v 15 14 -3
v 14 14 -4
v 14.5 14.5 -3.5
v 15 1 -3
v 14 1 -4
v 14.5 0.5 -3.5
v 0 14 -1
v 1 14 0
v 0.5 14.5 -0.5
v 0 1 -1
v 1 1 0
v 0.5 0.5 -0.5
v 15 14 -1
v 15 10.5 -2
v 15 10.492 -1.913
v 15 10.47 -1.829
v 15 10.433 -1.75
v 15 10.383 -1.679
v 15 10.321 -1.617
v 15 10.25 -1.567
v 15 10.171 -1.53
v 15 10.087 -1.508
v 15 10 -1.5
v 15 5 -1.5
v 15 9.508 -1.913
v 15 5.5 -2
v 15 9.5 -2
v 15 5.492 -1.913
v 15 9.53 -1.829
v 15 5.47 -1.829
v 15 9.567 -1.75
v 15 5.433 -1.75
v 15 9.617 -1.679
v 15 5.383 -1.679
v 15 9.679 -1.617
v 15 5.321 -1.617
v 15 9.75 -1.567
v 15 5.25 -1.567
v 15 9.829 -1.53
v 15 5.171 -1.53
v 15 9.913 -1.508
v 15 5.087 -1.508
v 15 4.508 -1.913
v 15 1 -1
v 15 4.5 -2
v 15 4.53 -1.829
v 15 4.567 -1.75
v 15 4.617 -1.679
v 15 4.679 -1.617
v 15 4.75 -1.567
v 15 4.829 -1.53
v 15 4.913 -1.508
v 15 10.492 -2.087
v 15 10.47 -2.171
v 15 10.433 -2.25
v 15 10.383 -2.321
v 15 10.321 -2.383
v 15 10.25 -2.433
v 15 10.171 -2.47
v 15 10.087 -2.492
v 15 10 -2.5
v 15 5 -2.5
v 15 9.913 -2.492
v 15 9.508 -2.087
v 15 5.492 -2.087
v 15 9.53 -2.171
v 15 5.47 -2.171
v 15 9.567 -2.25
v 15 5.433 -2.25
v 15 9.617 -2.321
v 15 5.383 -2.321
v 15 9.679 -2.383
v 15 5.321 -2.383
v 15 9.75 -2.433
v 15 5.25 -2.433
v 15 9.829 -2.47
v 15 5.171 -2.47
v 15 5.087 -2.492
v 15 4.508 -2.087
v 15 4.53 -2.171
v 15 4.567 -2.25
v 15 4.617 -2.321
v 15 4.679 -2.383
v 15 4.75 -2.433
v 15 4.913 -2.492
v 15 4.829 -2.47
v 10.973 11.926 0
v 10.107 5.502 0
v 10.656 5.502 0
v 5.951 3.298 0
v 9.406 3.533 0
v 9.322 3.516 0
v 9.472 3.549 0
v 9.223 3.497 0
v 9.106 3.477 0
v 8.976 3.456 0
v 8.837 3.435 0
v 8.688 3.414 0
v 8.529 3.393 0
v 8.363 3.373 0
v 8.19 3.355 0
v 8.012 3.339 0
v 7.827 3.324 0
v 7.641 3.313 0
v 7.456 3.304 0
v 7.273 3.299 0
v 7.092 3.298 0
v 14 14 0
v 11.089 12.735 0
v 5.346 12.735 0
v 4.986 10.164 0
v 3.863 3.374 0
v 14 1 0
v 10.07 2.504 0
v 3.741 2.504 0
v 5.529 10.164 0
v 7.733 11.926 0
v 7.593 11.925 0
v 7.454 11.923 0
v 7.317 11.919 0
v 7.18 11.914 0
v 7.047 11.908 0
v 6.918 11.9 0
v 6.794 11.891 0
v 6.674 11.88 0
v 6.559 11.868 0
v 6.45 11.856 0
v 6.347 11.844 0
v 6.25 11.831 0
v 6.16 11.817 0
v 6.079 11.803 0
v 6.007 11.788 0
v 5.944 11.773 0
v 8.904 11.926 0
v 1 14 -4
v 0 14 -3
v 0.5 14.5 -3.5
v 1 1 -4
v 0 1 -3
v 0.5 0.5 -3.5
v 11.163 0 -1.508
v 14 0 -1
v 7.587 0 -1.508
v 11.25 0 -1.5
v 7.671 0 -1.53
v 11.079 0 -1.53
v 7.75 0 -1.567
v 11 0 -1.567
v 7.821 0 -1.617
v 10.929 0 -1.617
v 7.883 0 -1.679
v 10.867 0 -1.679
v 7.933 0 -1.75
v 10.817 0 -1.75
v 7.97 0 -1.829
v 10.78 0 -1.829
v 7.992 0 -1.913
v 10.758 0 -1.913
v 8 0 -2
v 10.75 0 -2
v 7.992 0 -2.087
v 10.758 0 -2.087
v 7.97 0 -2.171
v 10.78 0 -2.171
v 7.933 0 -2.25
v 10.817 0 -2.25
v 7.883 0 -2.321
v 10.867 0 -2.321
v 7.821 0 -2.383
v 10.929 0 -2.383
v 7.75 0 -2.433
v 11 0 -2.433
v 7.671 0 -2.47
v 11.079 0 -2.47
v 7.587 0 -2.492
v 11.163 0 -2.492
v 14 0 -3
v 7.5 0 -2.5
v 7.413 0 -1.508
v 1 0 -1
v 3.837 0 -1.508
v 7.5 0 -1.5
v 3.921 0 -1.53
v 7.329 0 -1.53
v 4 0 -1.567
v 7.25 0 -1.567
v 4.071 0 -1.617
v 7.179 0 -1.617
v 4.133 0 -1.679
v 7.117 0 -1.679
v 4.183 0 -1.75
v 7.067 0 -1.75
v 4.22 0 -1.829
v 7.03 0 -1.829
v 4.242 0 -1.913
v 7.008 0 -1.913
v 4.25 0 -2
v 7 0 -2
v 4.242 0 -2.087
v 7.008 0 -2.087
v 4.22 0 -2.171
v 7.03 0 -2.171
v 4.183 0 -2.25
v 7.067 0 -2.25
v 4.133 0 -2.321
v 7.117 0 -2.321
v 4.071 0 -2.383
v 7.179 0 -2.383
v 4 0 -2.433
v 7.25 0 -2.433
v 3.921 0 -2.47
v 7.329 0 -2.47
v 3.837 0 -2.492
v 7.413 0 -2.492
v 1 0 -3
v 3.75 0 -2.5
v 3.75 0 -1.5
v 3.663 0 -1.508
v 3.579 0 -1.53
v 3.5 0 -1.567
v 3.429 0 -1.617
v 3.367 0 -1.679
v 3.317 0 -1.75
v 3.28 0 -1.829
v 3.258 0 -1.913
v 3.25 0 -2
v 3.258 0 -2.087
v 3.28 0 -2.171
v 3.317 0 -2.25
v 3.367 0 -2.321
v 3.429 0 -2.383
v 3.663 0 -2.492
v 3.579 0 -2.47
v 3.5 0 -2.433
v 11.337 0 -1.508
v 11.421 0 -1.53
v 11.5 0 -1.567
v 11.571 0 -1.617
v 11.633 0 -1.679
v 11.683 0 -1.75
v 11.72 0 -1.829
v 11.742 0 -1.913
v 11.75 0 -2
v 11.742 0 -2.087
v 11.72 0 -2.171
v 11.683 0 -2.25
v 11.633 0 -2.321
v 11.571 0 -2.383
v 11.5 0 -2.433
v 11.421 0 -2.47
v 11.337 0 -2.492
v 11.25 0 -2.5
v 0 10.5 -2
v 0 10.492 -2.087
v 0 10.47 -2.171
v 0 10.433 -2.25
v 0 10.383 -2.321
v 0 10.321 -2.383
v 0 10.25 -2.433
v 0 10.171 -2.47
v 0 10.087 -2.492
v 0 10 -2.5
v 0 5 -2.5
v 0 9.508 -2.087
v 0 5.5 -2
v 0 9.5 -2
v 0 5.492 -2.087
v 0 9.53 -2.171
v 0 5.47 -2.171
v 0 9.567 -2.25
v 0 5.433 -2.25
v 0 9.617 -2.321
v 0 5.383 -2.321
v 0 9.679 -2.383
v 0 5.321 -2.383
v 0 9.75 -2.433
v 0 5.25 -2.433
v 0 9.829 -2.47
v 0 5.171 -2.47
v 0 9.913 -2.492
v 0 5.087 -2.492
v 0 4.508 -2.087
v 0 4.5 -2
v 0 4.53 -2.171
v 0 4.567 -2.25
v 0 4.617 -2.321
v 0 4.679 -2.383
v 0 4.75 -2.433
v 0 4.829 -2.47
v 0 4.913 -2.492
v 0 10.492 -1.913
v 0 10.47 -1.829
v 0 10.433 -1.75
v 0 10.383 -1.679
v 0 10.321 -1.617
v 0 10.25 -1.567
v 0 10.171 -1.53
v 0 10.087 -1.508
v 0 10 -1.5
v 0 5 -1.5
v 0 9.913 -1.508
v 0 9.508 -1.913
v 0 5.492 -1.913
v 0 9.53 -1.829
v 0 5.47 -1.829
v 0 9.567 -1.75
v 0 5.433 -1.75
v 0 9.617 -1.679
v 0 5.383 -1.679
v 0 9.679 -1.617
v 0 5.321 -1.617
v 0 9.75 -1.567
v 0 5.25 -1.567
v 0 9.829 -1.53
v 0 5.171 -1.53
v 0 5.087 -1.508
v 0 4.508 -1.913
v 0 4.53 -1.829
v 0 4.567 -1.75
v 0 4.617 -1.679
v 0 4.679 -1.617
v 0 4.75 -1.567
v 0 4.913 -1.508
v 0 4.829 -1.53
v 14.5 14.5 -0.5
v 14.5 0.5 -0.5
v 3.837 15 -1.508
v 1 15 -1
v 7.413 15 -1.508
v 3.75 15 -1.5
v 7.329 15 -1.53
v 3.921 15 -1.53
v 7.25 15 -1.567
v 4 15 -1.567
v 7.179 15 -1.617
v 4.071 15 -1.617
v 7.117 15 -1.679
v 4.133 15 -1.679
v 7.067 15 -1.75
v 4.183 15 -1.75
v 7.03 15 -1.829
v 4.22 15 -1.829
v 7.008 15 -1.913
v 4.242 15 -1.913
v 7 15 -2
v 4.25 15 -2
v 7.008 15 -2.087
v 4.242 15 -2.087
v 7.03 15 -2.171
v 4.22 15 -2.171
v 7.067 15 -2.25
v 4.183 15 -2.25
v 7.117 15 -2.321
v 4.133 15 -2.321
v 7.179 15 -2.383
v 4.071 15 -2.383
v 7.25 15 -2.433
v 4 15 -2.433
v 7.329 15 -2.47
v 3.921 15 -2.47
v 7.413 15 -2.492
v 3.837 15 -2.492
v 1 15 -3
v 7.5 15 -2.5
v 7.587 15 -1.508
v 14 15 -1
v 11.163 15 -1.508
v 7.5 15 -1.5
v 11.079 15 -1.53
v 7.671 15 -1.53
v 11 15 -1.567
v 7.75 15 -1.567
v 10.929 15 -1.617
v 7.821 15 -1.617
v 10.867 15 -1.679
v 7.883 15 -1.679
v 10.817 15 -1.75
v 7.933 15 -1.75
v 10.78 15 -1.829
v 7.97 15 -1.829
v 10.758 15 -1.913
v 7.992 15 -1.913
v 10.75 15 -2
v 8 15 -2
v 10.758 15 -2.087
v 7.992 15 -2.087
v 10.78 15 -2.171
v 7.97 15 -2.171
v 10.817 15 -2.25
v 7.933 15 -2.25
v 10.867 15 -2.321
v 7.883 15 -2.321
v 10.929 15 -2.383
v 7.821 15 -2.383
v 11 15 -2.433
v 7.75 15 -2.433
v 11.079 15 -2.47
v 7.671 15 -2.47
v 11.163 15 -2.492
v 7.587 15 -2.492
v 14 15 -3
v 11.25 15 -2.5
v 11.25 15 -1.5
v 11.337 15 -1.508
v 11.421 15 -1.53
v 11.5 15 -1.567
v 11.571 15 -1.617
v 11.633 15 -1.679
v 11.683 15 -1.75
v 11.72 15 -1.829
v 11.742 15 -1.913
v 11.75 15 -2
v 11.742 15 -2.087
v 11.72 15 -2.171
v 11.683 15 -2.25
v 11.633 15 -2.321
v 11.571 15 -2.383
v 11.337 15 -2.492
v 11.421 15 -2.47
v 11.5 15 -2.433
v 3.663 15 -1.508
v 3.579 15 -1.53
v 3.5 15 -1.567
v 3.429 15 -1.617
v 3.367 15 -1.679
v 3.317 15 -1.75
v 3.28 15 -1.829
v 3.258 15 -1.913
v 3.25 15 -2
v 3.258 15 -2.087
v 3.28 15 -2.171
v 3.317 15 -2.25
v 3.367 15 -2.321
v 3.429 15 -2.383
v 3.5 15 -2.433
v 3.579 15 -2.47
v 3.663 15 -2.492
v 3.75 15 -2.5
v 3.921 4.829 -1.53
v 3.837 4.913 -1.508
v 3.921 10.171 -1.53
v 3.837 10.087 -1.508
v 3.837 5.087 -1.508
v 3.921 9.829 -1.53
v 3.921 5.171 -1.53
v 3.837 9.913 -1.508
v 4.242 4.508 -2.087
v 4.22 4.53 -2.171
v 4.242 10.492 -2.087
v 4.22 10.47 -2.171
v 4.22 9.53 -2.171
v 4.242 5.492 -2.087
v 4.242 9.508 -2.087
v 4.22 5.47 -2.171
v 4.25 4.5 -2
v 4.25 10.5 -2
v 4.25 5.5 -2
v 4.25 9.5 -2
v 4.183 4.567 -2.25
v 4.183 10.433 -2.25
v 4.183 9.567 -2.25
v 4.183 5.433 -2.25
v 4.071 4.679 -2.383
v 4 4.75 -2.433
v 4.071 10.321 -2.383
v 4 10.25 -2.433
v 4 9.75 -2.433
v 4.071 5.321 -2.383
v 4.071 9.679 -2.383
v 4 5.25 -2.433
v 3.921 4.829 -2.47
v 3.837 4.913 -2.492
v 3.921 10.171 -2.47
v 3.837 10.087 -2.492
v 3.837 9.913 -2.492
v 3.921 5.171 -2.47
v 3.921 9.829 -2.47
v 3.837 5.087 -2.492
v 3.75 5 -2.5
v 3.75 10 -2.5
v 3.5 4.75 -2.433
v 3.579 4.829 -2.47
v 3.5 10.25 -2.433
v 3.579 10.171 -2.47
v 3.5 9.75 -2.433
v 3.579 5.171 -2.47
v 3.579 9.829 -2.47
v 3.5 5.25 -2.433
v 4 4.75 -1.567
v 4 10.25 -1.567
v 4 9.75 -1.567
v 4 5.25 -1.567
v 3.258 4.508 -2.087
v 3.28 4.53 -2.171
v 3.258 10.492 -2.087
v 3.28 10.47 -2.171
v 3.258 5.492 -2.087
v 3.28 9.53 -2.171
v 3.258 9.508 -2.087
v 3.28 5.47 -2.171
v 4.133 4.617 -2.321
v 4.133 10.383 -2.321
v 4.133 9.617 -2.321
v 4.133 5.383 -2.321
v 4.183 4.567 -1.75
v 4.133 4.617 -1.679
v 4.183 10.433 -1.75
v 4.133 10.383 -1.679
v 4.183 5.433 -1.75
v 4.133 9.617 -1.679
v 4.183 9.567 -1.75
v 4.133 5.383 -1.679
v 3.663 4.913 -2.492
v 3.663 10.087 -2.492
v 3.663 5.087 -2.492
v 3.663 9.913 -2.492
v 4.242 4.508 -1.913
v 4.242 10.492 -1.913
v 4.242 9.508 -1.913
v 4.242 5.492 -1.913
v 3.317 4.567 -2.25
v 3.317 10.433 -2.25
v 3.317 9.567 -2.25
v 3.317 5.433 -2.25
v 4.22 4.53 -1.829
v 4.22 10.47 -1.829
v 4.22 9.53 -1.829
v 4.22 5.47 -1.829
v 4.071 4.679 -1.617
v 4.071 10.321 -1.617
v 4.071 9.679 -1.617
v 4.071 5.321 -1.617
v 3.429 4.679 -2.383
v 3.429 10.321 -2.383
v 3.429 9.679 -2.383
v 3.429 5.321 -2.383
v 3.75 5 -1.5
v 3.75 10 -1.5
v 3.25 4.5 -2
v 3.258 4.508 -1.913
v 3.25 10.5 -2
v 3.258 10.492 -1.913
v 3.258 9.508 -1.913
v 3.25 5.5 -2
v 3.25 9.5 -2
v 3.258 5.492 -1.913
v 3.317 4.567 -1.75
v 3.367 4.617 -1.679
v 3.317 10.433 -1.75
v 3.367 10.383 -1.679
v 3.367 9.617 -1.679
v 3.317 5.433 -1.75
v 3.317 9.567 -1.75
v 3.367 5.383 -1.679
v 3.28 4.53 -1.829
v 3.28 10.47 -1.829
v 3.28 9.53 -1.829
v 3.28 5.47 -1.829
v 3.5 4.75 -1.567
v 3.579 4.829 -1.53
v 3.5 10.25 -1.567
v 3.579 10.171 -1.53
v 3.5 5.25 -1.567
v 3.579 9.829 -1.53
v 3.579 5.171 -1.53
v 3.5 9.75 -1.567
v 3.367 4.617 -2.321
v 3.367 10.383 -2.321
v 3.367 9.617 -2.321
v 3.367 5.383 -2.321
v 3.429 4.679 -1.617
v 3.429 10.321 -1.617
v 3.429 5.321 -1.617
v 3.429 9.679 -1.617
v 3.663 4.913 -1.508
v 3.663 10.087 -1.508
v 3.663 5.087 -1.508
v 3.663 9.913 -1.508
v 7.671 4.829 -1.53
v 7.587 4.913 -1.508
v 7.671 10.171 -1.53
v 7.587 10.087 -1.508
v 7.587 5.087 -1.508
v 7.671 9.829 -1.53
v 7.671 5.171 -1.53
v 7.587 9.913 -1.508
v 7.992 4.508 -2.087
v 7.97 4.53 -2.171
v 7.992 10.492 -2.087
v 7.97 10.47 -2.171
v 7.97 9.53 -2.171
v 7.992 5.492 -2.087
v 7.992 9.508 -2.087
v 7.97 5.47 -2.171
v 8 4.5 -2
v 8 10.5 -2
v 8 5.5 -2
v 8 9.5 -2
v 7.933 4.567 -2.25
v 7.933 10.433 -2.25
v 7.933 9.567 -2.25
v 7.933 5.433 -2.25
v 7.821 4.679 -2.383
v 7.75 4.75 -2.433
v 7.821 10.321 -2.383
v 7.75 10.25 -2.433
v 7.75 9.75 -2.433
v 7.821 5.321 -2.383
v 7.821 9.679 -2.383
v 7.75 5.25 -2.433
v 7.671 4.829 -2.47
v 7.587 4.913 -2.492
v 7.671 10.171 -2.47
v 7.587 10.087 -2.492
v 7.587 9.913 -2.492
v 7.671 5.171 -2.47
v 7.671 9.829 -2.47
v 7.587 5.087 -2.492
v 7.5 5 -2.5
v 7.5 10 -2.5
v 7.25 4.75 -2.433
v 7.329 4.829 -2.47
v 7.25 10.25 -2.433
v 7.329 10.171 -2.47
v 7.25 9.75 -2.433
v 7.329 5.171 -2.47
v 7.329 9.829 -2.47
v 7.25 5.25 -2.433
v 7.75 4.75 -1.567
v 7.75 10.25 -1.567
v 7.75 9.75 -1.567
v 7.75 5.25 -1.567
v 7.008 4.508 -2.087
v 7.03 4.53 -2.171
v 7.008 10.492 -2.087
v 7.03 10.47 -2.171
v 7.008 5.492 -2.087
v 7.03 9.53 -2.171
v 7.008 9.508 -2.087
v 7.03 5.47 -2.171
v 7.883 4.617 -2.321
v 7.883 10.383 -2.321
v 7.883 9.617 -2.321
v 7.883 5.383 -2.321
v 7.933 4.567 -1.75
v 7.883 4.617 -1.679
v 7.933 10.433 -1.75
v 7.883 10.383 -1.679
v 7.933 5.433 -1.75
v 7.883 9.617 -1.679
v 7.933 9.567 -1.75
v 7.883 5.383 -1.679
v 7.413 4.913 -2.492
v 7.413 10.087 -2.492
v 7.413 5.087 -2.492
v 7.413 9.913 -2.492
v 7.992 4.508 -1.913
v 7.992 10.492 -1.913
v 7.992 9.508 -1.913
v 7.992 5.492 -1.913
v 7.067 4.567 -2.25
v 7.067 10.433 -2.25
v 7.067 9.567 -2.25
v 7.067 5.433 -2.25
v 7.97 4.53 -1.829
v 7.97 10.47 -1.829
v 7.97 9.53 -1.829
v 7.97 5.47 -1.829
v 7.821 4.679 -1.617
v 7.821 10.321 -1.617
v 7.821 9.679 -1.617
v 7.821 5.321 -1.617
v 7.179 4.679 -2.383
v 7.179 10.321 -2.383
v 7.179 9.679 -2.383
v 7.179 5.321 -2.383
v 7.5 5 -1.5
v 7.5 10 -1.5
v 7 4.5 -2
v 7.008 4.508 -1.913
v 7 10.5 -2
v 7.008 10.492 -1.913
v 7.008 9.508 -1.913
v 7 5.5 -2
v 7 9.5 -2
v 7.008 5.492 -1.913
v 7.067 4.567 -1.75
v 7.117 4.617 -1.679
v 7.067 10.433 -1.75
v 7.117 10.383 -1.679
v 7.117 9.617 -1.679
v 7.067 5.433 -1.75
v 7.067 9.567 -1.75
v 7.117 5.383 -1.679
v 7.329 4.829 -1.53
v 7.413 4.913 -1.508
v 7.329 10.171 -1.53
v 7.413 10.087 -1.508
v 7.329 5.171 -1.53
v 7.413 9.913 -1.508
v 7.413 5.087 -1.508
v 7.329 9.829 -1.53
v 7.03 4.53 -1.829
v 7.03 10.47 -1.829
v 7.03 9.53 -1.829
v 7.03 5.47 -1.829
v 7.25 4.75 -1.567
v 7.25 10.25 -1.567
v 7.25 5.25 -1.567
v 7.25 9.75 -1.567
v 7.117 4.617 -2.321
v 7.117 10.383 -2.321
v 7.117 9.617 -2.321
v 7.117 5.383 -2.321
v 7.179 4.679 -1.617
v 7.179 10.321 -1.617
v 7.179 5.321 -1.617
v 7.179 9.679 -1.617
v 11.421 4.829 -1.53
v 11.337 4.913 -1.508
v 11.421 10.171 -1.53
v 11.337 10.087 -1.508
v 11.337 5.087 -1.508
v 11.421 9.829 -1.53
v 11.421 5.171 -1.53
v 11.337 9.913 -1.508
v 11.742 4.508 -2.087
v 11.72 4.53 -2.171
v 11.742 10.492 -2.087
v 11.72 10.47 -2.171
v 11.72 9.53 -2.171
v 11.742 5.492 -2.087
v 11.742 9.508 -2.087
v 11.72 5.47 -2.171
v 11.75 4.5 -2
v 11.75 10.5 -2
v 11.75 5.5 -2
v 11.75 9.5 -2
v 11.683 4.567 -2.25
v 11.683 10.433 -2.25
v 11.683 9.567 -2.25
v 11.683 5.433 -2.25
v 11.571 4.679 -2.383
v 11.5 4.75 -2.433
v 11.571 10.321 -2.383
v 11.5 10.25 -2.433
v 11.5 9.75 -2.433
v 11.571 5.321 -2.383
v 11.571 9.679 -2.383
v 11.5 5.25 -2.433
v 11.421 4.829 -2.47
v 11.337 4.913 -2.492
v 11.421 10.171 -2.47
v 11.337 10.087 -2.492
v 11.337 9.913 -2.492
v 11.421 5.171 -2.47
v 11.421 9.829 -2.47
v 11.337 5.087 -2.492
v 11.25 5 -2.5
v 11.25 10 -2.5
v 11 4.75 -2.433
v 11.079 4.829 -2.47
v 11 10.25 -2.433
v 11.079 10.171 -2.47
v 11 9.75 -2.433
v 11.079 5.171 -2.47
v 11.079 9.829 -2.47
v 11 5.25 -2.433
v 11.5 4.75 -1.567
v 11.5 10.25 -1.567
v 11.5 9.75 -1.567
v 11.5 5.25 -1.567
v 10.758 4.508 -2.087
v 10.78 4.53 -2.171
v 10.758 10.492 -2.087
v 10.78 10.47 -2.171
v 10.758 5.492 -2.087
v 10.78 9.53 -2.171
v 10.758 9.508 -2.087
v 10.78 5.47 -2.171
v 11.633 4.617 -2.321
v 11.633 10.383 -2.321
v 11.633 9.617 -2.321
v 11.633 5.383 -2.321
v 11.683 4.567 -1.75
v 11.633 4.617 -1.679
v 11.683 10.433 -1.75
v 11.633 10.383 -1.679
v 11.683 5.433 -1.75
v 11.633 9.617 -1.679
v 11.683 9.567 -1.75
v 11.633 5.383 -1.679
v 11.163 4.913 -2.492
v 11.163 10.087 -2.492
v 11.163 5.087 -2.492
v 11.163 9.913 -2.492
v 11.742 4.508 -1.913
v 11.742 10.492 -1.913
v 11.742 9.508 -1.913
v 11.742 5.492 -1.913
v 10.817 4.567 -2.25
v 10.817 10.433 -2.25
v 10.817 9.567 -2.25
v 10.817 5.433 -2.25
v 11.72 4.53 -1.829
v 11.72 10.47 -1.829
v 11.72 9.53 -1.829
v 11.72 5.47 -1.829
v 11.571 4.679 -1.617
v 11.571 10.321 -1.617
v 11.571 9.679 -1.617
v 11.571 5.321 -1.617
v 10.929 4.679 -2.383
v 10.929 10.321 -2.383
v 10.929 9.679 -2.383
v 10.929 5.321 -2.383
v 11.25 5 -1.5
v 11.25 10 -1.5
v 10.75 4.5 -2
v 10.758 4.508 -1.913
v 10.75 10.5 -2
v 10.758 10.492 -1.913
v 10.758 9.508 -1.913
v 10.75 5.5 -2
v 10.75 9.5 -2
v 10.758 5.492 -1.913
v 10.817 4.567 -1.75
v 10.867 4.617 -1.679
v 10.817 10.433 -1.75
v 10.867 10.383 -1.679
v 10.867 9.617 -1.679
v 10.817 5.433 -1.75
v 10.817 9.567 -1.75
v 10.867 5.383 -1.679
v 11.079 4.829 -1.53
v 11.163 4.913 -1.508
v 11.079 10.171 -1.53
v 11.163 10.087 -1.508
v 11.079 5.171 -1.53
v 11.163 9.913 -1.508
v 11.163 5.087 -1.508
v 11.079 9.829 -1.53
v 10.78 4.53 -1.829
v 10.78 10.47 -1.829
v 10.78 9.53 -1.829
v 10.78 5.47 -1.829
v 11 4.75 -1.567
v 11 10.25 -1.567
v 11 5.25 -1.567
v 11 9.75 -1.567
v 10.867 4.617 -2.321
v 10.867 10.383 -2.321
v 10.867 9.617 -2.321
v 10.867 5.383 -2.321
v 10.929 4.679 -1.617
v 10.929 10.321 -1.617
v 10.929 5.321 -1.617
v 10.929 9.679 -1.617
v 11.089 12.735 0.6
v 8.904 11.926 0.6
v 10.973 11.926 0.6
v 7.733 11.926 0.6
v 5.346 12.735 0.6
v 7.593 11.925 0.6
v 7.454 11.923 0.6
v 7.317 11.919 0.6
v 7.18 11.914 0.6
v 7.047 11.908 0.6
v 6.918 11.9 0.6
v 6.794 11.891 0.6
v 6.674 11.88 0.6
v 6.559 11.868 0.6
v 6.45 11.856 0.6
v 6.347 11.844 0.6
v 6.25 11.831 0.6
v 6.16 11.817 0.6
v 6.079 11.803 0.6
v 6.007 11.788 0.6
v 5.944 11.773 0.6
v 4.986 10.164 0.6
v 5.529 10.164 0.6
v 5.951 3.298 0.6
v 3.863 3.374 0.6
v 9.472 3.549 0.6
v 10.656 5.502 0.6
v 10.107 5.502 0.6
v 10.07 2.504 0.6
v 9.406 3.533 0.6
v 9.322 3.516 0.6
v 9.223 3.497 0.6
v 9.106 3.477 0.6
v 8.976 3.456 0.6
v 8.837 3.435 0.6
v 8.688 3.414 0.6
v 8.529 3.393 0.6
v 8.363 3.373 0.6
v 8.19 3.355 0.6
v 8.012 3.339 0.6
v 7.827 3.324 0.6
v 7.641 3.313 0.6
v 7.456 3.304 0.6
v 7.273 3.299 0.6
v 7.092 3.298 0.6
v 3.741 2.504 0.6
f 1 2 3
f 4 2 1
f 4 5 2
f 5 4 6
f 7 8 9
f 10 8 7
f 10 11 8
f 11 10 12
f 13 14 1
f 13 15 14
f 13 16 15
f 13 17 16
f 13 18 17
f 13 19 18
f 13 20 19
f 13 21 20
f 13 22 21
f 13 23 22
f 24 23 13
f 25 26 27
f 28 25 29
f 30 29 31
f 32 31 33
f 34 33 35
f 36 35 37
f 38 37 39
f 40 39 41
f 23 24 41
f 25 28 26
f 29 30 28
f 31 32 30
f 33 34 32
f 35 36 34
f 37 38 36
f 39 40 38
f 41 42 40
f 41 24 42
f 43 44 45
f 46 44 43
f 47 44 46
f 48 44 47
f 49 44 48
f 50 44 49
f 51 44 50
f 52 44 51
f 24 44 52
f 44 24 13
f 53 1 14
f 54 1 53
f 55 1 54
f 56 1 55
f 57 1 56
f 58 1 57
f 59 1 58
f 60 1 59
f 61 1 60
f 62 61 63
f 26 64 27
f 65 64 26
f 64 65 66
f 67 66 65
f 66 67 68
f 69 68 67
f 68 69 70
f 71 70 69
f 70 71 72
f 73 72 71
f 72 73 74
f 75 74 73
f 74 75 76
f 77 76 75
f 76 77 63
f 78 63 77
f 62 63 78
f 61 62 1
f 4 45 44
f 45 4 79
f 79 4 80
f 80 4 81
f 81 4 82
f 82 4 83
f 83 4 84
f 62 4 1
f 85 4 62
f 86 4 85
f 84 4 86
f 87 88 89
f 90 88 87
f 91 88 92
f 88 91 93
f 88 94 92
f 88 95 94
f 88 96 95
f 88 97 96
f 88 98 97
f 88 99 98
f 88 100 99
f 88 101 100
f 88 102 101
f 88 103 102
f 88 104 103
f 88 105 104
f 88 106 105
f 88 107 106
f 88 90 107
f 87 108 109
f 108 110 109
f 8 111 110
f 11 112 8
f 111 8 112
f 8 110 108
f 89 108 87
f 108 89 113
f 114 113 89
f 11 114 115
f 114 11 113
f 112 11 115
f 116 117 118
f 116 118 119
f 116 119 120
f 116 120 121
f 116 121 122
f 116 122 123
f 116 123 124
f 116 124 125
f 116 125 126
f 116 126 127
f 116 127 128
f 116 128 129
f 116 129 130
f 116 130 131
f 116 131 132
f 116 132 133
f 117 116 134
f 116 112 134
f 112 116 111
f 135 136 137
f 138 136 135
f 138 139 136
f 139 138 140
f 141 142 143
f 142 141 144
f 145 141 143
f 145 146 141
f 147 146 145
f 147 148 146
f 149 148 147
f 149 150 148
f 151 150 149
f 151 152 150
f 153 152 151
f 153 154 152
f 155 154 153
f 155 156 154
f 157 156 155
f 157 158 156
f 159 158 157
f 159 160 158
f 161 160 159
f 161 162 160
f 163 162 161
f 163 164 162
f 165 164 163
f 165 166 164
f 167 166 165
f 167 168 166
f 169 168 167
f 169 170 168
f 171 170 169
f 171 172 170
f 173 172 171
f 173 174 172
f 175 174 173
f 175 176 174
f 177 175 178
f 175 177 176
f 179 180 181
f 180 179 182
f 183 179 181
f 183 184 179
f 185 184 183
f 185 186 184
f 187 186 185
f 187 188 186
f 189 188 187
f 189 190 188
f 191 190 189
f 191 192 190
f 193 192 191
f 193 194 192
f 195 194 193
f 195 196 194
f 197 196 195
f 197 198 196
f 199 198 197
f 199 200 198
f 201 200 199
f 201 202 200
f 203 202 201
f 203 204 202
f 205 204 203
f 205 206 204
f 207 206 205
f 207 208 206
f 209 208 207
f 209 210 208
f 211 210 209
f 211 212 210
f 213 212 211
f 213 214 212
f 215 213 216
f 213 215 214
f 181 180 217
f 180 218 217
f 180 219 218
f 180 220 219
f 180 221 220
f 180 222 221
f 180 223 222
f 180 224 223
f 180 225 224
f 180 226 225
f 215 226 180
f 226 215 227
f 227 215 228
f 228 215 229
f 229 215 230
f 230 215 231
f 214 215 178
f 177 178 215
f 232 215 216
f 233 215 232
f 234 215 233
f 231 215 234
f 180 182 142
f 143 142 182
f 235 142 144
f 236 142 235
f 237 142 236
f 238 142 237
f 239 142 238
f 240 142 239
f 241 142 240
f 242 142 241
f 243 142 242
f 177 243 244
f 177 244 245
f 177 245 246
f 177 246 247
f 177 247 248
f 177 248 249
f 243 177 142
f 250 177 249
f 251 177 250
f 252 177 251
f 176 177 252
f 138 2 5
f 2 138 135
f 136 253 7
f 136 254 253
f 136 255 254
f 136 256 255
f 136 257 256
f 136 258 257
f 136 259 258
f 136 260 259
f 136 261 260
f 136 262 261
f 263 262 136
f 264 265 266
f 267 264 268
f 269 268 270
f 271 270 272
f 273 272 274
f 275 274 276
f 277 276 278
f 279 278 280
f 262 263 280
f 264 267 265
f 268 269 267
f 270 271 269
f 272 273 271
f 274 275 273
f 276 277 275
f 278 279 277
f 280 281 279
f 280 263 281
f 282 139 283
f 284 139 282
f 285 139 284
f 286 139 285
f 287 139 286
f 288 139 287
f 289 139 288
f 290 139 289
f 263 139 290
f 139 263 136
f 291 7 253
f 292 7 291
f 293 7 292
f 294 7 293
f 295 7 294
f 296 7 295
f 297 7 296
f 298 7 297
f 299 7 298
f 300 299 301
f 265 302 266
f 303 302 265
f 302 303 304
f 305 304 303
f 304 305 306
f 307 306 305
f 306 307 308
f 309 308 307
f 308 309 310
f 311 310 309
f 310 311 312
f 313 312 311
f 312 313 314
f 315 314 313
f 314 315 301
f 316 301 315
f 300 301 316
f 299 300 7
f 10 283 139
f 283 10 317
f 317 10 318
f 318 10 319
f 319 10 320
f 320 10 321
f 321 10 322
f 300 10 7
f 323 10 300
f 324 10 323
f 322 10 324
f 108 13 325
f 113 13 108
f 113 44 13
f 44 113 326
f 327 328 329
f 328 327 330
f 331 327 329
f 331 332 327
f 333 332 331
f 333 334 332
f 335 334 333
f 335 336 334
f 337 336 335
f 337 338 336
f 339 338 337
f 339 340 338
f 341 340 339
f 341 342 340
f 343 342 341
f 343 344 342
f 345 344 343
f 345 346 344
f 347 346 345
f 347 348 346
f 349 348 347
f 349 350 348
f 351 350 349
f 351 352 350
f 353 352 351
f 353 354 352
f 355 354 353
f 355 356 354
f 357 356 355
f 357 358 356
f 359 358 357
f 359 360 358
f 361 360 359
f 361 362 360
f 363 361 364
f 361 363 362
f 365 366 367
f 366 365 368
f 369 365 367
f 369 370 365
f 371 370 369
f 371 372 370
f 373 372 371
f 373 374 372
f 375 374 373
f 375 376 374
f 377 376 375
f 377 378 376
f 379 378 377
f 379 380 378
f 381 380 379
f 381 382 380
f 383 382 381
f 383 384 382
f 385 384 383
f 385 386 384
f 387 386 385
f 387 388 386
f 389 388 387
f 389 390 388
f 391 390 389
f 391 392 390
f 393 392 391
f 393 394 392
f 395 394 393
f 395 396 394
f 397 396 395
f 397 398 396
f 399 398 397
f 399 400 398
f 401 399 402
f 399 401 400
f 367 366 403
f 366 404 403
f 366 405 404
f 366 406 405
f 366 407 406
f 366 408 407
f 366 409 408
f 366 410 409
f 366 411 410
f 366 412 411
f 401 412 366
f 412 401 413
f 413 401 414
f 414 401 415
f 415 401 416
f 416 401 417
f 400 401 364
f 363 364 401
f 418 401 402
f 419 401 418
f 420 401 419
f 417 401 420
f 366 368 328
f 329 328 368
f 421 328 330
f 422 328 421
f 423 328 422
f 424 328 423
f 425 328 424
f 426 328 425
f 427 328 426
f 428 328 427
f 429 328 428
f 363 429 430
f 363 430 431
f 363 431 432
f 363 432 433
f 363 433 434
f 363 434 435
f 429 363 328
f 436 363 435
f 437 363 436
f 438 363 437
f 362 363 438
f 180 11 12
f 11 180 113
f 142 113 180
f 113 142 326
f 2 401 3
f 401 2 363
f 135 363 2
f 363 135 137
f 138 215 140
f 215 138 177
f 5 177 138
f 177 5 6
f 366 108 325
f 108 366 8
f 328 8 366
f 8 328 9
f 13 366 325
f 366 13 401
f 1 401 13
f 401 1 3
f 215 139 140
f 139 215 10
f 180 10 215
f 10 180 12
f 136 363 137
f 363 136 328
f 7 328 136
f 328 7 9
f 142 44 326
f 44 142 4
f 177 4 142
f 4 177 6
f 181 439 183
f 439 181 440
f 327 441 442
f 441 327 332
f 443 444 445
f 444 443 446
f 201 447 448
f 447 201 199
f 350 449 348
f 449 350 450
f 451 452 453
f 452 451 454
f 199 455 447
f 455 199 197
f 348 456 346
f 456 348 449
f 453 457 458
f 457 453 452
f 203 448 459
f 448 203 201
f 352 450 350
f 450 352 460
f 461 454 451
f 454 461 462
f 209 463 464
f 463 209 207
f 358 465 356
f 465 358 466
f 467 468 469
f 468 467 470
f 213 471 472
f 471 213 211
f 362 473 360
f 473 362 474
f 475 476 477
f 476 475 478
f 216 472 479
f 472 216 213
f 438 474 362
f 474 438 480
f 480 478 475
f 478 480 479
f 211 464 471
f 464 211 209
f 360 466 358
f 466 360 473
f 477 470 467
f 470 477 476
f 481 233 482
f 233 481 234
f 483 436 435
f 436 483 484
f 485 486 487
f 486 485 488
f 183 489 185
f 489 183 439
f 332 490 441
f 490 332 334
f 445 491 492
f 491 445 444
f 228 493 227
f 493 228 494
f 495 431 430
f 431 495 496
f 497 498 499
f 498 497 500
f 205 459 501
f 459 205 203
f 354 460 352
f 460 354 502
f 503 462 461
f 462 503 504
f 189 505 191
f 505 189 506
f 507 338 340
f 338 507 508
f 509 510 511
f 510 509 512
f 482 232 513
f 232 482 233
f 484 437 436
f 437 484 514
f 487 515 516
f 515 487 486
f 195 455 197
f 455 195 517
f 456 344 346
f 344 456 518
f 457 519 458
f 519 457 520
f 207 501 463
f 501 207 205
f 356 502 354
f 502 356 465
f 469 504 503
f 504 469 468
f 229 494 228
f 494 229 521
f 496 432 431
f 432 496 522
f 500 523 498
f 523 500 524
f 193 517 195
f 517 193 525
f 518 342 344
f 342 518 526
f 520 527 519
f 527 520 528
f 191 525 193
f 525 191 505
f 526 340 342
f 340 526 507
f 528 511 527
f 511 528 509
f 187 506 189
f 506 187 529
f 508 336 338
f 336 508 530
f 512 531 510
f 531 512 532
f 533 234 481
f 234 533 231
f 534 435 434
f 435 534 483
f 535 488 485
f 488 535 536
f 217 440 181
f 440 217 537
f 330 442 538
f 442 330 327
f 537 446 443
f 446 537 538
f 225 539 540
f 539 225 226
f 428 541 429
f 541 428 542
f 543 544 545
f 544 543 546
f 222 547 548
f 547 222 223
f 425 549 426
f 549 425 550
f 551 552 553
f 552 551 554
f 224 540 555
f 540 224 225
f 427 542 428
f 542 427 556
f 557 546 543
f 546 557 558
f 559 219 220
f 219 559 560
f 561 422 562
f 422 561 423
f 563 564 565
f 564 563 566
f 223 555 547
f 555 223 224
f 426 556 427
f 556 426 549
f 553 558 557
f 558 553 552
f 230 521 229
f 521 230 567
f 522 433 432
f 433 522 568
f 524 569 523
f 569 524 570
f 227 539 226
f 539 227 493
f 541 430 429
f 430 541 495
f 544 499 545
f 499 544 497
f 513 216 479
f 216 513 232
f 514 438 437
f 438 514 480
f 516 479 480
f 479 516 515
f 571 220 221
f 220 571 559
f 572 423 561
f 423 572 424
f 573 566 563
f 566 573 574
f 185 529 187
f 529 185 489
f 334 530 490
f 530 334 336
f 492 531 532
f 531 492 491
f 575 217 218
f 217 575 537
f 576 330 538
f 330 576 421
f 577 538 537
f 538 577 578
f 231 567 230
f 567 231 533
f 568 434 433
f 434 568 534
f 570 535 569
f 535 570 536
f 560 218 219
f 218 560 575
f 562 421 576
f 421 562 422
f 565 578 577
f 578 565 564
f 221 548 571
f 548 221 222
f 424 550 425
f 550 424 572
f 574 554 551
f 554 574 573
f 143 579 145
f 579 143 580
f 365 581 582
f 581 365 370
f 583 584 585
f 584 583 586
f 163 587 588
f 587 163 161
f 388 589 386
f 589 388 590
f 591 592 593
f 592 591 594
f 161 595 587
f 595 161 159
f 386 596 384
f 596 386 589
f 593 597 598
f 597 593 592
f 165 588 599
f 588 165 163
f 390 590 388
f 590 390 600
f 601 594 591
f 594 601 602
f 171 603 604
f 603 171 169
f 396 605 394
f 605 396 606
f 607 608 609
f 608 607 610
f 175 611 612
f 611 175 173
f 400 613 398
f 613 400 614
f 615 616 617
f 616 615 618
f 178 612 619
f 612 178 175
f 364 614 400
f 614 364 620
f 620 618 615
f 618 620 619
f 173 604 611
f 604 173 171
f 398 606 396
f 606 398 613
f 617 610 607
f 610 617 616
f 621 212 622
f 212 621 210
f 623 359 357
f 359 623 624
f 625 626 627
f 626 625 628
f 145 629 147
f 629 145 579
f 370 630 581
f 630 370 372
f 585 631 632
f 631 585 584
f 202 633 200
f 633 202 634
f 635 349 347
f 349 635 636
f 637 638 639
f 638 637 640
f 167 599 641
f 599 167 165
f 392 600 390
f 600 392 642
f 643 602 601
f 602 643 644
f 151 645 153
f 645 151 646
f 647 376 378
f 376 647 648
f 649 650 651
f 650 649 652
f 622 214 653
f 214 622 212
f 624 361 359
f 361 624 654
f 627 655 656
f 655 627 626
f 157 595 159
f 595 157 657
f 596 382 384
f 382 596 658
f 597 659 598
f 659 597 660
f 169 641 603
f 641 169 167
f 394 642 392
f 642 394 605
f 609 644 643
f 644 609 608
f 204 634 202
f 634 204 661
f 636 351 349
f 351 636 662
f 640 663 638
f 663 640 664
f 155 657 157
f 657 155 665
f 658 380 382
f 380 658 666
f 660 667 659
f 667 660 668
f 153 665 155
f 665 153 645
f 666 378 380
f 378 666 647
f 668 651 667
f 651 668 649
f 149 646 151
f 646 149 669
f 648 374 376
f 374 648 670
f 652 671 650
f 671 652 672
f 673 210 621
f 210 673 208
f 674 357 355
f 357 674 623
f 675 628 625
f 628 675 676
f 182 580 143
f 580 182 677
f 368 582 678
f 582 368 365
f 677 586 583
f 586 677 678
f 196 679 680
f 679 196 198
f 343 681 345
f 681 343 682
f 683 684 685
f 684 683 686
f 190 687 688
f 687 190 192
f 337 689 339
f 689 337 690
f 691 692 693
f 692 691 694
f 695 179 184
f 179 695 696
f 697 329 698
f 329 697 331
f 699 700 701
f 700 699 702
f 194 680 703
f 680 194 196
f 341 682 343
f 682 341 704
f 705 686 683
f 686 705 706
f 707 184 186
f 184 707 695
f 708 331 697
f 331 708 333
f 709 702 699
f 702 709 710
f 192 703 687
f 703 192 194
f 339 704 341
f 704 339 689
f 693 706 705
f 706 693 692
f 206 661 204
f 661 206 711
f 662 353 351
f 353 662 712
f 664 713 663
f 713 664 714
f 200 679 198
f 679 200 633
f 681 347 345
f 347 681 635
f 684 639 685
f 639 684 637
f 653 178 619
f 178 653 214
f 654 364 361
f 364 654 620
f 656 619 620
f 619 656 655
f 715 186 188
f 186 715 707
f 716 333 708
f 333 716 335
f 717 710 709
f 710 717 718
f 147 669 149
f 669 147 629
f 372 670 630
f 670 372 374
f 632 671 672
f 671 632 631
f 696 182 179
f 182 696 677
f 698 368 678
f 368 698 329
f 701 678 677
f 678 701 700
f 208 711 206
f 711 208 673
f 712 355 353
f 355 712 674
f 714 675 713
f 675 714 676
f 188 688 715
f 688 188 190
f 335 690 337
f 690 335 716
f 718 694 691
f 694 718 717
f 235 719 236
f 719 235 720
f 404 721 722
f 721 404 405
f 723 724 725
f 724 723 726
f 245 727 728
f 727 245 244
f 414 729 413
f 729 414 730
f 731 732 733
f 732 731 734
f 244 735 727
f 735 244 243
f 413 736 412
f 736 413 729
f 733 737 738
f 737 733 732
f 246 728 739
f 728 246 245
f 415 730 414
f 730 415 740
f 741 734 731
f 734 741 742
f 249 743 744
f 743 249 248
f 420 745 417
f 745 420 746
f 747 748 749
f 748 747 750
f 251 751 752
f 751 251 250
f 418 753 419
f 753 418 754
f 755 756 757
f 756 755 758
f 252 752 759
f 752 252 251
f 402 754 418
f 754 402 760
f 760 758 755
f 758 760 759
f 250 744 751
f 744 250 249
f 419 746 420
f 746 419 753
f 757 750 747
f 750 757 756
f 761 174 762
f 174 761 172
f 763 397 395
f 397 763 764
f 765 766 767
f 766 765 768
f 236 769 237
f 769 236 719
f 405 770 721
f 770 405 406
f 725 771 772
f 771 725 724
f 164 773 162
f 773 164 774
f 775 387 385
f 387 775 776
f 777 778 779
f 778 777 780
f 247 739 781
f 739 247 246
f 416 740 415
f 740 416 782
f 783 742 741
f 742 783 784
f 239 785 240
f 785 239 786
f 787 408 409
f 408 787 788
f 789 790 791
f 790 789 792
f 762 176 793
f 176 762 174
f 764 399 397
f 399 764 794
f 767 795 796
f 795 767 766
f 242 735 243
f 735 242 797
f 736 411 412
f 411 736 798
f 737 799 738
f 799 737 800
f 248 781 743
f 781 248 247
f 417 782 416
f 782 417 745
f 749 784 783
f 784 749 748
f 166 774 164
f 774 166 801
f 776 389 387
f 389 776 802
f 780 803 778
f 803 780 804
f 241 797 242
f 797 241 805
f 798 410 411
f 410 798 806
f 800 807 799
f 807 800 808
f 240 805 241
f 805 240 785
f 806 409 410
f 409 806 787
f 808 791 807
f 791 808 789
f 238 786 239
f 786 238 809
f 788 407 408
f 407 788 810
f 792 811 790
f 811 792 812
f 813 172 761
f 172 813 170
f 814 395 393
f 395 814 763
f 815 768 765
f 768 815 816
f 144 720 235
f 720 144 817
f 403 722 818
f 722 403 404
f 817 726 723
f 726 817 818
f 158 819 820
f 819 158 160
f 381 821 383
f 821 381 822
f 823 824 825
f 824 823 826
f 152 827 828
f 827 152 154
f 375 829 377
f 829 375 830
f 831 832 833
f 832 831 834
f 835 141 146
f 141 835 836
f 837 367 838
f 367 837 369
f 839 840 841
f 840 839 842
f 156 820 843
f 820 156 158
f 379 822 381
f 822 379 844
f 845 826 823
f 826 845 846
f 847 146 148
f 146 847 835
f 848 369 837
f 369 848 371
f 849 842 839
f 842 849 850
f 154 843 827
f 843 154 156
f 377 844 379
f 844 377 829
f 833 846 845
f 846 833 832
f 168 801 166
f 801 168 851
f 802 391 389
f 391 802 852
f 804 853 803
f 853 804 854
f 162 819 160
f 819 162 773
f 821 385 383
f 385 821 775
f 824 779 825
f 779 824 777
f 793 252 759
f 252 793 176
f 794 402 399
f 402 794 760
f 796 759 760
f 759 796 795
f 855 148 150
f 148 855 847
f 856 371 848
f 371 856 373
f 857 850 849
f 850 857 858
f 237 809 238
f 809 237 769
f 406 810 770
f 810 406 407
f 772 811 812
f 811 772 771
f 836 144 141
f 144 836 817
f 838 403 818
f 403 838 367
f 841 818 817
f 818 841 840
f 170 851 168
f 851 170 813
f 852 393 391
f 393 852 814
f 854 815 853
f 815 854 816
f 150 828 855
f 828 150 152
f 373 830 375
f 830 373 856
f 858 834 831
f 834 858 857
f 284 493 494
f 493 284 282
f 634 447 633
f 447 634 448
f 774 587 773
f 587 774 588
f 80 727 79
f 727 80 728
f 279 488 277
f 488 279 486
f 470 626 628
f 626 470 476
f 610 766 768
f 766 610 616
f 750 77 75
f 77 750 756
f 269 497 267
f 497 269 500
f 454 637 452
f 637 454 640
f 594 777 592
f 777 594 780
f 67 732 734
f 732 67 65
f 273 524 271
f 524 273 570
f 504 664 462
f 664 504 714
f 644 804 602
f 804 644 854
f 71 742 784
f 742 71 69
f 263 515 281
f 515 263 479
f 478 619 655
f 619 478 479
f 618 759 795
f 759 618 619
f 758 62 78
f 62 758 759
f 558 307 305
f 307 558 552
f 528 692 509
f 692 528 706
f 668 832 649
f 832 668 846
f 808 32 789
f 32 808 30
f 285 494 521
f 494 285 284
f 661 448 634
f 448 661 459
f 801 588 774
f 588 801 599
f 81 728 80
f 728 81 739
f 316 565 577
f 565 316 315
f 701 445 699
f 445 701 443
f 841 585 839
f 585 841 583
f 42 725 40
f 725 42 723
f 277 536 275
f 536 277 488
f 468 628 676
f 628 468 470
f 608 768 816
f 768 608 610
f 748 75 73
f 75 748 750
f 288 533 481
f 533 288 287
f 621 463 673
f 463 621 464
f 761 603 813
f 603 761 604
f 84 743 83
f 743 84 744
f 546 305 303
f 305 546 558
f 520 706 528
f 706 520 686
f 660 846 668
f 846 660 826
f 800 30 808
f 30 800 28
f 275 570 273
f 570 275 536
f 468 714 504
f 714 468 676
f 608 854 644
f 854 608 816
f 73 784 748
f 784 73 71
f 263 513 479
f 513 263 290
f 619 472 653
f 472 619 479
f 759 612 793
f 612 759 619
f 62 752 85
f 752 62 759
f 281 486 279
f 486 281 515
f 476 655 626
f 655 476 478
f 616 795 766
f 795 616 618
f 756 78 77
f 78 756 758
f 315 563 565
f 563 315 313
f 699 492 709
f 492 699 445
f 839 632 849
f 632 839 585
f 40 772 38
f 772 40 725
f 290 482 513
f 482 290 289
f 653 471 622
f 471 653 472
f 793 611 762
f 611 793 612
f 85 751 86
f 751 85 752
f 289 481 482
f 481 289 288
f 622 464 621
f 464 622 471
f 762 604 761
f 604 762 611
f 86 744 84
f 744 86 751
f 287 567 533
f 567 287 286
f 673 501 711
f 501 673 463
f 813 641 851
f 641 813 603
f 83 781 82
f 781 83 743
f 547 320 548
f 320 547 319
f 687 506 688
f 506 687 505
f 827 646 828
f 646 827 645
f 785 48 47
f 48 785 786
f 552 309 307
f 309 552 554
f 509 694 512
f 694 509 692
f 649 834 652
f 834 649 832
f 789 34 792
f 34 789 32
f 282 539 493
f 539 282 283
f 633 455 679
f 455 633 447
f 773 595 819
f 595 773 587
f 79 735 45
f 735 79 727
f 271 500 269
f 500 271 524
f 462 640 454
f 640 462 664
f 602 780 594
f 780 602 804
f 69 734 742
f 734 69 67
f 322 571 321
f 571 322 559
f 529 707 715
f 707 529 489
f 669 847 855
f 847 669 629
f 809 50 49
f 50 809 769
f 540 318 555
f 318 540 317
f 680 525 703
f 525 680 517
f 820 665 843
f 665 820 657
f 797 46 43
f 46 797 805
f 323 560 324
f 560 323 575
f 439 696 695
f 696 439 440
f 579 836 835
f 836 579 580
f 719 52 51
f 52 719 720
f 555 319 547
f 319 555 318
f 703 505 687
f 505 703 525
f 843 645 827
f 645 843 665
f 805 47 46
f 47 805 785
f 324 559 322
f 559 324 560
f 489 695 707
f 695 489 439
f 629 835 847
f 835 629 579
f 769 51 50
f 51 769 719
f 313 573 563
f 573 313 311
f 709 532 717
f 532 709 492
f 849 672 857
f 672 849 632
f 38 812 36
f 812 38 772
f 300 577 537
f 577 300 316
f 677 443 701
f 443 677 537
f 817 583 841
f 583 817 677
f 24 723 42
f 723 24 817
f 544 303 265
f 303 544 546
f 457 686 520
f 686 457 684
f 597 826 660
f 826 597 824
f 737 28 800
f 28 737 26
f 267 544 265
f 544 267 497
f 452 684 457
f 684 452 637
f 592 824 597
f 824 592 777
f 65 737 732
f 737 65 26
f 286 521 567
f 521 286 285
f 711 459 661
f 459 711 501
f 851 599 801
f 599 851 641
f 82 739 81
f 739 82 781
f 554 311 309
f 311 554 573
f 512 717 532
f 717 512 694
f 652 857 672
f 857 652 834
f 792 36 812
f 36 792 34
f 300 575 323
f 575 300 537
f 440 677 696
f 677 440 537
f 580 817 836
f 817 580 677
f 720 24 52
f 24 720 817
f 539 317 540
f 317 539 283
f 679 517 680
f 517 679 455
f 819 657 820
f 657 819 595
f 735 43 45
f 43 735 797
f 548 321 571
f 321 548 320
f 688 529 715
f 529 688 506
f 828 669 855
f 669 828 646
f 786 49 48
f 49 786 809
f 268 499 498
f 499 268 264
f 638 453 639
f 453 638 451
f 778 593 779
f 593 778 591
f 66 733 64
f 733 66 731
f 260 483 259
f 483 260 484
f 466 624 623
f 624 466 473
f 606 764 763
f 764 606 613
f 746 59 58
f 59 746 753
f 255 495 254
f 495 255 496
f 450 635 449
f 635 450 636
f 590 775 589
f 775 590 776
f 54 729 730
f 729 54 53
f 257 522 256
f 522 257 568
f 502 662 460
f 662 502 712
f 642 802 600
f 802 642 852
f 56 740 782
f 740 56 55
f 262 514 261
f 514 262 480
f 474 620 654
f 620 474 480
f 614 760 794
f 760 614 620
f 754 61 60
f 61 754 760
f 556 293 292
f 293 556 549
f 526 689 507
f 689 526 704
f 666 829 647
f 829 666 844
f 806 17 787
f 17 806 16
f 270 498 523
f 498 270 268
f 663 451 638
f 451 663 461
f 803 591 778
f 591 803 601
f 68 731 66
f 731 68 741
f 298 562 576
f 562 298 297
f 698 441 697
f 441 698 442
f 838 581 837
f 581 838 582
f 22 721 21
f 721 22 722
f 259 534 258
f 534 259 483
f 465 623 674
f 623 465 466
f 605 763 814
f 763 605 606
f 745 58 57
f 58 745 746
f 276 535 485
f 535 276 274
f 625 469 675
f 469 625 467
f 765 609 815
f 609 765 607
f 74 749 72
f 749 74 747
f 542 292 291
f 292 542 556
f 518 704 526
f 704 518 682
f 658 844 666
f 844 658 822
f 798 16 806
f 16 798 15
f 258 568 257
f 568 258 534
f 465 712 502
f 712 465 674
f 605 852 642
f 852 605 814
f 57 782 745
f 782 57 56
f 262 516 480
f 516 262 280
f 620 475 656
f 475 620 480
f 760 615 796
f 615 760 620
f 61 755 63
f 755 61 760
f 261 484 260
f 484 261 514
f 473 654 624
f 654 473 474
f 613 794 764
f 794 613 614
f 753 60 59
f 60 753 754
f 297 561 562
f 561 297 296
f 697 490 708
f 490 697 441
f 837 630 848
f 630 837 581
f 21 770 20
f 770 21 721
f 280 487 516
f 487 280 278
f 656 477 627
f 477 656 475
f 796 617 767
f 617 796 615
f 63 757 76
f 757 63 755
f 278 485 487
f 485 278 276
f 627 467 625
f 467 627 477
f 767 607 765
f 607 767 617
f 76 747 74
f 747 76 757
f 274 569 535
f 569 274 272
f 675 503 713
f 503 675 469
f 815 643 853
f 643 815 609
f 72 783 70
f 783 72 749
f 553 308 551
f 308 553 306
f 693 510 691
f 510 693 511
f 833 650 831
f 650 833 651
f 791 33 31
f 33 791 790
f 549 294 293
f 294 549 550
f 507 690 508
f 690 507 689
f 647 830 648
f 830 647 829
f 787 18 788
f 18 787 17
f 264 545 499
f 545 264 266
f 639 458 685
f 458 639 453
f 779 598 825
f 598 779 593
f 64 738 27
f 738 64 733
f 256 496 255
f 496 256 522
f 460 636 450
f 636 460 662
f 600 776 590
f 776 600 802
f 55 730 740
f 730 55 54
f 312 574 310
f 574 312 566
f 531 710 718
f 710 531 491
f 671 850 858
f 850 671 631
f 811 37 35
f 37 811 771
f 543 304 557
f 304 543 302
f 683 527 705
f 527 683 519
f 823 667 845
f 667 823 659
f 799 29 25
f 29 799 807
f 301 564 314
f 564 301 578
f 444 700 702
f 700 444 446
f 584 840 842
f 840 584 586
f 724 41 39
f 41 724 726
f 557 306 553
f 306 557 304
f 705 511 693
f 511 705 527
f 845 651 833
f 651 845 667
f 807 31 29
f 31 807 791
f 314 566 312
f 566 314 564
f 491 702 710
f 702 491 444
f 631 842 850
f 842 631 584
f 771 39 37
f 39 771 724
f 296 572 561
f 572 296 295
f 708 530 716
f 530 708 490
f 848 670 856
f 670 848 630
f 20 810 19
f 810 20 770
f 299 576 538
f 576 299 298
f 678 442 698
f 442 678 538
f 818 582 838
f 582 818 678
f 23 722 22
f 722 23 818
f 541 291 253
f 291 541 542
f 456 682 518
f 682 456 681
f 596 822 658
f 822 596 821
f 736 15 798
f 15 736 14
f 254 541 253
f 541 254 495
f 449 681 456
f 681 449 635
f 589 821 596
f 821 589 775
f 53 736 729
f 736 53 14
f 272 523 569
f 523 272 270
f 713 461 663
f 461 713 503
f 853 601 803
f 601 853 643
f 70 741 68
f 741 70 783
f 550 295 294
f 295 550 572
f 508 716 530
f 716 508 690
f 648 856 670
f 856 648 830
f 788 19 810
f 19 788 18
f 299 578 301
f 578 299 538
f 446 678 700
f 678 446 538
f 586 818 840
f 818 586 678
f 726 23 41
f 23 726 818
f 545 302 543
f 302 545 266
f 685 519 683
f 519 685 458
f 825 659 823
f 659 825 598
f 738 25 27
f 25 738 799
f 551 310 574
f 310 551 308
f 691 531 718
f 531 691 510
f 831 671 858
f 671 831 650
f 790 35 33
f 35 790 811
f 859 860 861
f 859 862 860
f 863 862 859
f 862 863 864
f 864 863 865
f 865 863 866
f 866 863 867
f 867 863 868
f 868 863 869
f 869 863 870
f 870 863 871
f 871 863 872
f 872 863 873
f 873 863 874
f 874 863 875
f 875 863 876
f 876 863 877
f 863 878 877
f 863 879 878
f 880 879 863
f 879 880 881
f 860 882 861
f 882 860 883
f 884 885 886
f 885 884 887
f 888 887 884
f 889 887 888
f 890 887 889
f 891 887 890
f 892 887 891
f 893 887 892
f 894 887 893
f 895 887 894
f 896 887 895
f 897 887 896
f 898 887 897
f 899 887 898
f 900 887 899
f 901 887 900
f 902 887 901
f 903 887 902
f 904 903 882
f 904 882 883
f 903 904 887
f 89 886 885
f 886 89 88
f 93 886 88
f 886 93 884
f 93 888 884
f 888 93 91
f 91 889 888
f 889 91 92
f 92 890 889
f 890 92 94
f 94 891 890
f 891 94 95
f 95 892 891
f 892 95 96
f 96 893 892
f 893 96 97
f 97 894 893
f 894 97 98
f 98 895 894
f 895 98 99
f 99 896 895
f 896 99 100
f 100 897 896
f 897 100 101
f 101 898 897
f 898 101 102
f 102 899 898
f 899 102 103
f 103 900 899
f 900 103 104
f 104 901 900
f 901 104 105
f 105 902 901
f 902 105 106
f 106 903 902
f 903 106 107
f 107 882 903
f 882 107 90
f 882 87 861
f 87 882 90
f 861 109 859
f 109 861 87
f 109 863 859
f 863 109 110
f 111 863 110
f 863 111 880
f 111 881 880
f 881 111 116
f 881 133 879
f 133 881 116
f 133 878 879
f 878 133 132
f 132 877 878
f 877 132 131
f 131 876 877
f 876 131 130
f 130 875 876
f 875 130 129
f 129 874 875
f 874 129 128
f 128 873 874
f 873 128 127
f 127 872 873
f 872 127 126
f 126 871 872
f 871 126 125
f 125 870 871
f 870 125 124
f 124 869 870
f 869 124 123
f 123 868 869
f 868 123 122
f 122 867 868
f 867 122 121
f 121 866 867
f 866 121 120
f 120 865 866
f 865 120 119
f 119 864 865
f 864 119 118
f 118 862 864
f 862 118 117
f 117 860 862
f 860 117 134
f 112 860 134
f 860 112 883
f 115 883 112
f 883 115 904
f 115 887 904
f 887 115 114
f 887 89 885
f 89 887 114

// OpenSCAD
// Customizable Letter Tiles
// Will Schleter (wschleter@gmail.com) Dec 14, 2016

/* [Text Settings] */
// Tile text
txt = "Z";
// Text extrusion height (mm)
e = 0.6;
// Text size as percentage of tile height
ts = 0.75;
// Text aspect ratio - w/h
ar = 0.8;
// Text font
fn = "Serif"; // [Sans, Mono, Sans Narrow, Serif]
// Text style
tst = "bold italic"; //[:Regular,bold:Bold,italic:Italic,bold italic:Bold/Italic]

/* [Tile Settings] */
// Tile height (mm)
th = 15;
// Tile width (mm, use 0 to autosize)
tw = 15;
// Tile thickness (mm)
tt = 4;
// Tile separator - character in text used to split, leave empty to split on every character
sep = "";
// Tile width multiplier (use to adjust width of autosized tiles)
twm = 1;

/* [Hole Settings] */
// Hole diameter (mm)
d = 1;
// Number of side holes
ns = 2; // [0,1,2,3]
// Number of top holes
nt = 3; // [0,1,2,3]

/* [Chamfer Settings] */
// Top chamfer size (mm)
cht = 1;
// Side chamfer size (mm)
chs = 1;
// Corner chamfer size (mm)
chc = 1;
// Chamfers on bottom
chb = 1; // [0:No, 1:Yes]

/* [Layout Settings] */
// Number of tiles per row
tpr = 4;
// Tile spacing (mm)
sp = 2;

/* [Image Tile] */
// Use image (if set to yes the text settings will be ignored and a single tile generated)
useimg = 0; // [0:No, 1:Yes]
// image extrusion height (mm)
ie = 0.6;
// Image height as percentage of tile height
ih = 0.75;
// Image width as percentage of tile width
iw = 0.75;
// Upload an image that will be used
image_file = "dog100.png"; // [image_surface:100x100]

// split text into tiles
txt2 = useimg==1 ? " " : txt;
list = len(sep)==0 ? str2vec(txt2) : split(txt2,sep);

// loop through each tile
h=th;
w=tw;
t=tt;
tilesperrow = (tw==0) ? 1 : tpr; // force tpr to be 1 if autowidth
for (j=[0:len(list)-1]) {
  // make and position each tile
  w = (tw>0) ? tw : (len(list[j]) + 0.5)*th*ts*ar*twm; 
  row = floor(j/tilesperrow);
  yy = -row*(h+sp);
  xx = (j-row*tilesperrow)*(w+sp);
  translate([xx,yy,0]) makeTile(list[j],w);
}

module makeTile(letter,w) {
    difference() {
      makeBlock(w);
      if (nt>0) { makeTopHoles(w); }
      if (ns>0) { makeSideHoles(w); }
      }
    if (useimg) makeImage(w);
    else makeText(letter,w);
}

module makeBlock(w) {
// three intersecting polygon extrusions are used to support chamfers on all edges
  intersection() {

// this is the y (height) polygon
  rotate([-90,0,0])
  linear_extrude(h)
  polygon([[chs,0],[w-chs,0],[w,chs],[w,t-chs*chb],[w-chs*chb,t],[chs*chb,t],[0,t-chs*chb],[0,chs]]);

 // this is the x (width) polygon
  translate([w,0,0])
  rotate([-90,0,90])
  linear_extrude(w)
  polygon([[cht,0],[h-cht,0],[h,cht],[h,t-cht*chb],[h-cht*chb,t],[cht*chb,t],[0,t-cht*chb],[0,cht]]);

 // this is the z (thickness) polygon
  translate([0,0,-t])
  rotate([0,0,0])
  linear_extrude(t)
  polygon([[chc,0],[w-chc,0],[w,chc],[w,h-chc],[w-chc,h],[chc,h],[0,h-chc],[0,chc]]);

}
}

module makeTopHoles(w) {
  s=w/(nt+1);
  for (i=[0:nt-1]) {
    translate([i*s+s,h/2,-t/2])
    rotate([-90,0,0])
    cylinder(h=h*2, d=d, center=true,$fn=36);
  }
}

module makeSideHoles(w) {
  s=h/(ns+1);
  for (i=[0:ns-1]) {
    translate([w/2,i*s+s,-t/2])
    rotate([0,90,0])
    cylinder(h=w*2, d=d, center=true,$fn=36);
  }
}
 
module makeText(letter,w) {
//text on top
  translate([w/2,h/2,-e])
  linear_extrude(height = e*2) 
  scale([ar,1,1])
  text(text = letter,
            font = str("Liberation ",fn,":style=",tst),
            size = h*ts,
            valign = "center",
            halign = "center");
  
}

module makeImage(w) {
// image comes in 100x100
translate([w/2,h/2,0])
scale([w*iw/100,h*ih/100,ie])
surface(file=image_file,center=true,invert=true);
}

///////////////////////////////////////////////////////////////////
// functions below from http://www.thingiverse.com/thing:1237203 //
///////////////////////////////////////////////////////////////////

/**** split ****

[vect] split(`str`, `[sep]`)
Returns a vector of substrings by cutting the string `str` each time where `sep` appears.
See also: strcat(), str2vec()

Arguments:
- [str] `str`: The original string.
- [char] `sep`: The separator who cuts the string (" " by default).

Usage:
str = "OpenScad is a free CAD software.";
echo(split(str)); // ["OpenScad", "is", "a", "free", "CAD", "software."]
echo(split(str)[3]); // "free"
echo(split("foo;bar;baz", ";")); // ["foo", "bar", "baz"]
*/
function split(str, sep=" ", i=0, word="", v=[]) =
	i == len(str) ? concat(v, word) :
	str[i] == sep ? split(str, sep, i+1, "", concat(v, word)) :
	split(str, sep, i+1, str(word, str[i]), v);

/**** str2vec ****

[vect] str2vec(`str`)
Returns a vector of chars, corresponding to the string `str`.
See also: split()

Arguments:
- [str] `str`: The original string.

Usage:
echo(str2vec("foo")); // ["f", "o", "o"] 
*/
function str2vec(str, v=[], i=0) =
	i == len(str) ? v :
	str2vec(str, concat(v, str[i]), i+1);

/**** substr ****

[str] substr(`str`, `[pos]`, `[len]`)
Returns a substring of a string.

Arguments:
- [str] `str`: The original string.
- [int] `pos` (optional): The substring position (0 by default).
- [int] `len` (optional): The substring length (string length by default).

Usage:
str = "OpenScad is a free CAD software.";
echo(substr(str, 12)); // "a free CAD software."
echo(substr(str, 12, 10)); // "a free CAD"
echo(substr(str, len=8)); // or substr(str, 0, 8); // "OpenScad"
*/
function substr(str, pos=0, len=-1, substr="") =
	len == 0 ? substr :
	len == -1 ? substr(str, pos, len(str)-pos, substr) :
	substr(str, pos+1, len-1, str(substr, str[pos]));
